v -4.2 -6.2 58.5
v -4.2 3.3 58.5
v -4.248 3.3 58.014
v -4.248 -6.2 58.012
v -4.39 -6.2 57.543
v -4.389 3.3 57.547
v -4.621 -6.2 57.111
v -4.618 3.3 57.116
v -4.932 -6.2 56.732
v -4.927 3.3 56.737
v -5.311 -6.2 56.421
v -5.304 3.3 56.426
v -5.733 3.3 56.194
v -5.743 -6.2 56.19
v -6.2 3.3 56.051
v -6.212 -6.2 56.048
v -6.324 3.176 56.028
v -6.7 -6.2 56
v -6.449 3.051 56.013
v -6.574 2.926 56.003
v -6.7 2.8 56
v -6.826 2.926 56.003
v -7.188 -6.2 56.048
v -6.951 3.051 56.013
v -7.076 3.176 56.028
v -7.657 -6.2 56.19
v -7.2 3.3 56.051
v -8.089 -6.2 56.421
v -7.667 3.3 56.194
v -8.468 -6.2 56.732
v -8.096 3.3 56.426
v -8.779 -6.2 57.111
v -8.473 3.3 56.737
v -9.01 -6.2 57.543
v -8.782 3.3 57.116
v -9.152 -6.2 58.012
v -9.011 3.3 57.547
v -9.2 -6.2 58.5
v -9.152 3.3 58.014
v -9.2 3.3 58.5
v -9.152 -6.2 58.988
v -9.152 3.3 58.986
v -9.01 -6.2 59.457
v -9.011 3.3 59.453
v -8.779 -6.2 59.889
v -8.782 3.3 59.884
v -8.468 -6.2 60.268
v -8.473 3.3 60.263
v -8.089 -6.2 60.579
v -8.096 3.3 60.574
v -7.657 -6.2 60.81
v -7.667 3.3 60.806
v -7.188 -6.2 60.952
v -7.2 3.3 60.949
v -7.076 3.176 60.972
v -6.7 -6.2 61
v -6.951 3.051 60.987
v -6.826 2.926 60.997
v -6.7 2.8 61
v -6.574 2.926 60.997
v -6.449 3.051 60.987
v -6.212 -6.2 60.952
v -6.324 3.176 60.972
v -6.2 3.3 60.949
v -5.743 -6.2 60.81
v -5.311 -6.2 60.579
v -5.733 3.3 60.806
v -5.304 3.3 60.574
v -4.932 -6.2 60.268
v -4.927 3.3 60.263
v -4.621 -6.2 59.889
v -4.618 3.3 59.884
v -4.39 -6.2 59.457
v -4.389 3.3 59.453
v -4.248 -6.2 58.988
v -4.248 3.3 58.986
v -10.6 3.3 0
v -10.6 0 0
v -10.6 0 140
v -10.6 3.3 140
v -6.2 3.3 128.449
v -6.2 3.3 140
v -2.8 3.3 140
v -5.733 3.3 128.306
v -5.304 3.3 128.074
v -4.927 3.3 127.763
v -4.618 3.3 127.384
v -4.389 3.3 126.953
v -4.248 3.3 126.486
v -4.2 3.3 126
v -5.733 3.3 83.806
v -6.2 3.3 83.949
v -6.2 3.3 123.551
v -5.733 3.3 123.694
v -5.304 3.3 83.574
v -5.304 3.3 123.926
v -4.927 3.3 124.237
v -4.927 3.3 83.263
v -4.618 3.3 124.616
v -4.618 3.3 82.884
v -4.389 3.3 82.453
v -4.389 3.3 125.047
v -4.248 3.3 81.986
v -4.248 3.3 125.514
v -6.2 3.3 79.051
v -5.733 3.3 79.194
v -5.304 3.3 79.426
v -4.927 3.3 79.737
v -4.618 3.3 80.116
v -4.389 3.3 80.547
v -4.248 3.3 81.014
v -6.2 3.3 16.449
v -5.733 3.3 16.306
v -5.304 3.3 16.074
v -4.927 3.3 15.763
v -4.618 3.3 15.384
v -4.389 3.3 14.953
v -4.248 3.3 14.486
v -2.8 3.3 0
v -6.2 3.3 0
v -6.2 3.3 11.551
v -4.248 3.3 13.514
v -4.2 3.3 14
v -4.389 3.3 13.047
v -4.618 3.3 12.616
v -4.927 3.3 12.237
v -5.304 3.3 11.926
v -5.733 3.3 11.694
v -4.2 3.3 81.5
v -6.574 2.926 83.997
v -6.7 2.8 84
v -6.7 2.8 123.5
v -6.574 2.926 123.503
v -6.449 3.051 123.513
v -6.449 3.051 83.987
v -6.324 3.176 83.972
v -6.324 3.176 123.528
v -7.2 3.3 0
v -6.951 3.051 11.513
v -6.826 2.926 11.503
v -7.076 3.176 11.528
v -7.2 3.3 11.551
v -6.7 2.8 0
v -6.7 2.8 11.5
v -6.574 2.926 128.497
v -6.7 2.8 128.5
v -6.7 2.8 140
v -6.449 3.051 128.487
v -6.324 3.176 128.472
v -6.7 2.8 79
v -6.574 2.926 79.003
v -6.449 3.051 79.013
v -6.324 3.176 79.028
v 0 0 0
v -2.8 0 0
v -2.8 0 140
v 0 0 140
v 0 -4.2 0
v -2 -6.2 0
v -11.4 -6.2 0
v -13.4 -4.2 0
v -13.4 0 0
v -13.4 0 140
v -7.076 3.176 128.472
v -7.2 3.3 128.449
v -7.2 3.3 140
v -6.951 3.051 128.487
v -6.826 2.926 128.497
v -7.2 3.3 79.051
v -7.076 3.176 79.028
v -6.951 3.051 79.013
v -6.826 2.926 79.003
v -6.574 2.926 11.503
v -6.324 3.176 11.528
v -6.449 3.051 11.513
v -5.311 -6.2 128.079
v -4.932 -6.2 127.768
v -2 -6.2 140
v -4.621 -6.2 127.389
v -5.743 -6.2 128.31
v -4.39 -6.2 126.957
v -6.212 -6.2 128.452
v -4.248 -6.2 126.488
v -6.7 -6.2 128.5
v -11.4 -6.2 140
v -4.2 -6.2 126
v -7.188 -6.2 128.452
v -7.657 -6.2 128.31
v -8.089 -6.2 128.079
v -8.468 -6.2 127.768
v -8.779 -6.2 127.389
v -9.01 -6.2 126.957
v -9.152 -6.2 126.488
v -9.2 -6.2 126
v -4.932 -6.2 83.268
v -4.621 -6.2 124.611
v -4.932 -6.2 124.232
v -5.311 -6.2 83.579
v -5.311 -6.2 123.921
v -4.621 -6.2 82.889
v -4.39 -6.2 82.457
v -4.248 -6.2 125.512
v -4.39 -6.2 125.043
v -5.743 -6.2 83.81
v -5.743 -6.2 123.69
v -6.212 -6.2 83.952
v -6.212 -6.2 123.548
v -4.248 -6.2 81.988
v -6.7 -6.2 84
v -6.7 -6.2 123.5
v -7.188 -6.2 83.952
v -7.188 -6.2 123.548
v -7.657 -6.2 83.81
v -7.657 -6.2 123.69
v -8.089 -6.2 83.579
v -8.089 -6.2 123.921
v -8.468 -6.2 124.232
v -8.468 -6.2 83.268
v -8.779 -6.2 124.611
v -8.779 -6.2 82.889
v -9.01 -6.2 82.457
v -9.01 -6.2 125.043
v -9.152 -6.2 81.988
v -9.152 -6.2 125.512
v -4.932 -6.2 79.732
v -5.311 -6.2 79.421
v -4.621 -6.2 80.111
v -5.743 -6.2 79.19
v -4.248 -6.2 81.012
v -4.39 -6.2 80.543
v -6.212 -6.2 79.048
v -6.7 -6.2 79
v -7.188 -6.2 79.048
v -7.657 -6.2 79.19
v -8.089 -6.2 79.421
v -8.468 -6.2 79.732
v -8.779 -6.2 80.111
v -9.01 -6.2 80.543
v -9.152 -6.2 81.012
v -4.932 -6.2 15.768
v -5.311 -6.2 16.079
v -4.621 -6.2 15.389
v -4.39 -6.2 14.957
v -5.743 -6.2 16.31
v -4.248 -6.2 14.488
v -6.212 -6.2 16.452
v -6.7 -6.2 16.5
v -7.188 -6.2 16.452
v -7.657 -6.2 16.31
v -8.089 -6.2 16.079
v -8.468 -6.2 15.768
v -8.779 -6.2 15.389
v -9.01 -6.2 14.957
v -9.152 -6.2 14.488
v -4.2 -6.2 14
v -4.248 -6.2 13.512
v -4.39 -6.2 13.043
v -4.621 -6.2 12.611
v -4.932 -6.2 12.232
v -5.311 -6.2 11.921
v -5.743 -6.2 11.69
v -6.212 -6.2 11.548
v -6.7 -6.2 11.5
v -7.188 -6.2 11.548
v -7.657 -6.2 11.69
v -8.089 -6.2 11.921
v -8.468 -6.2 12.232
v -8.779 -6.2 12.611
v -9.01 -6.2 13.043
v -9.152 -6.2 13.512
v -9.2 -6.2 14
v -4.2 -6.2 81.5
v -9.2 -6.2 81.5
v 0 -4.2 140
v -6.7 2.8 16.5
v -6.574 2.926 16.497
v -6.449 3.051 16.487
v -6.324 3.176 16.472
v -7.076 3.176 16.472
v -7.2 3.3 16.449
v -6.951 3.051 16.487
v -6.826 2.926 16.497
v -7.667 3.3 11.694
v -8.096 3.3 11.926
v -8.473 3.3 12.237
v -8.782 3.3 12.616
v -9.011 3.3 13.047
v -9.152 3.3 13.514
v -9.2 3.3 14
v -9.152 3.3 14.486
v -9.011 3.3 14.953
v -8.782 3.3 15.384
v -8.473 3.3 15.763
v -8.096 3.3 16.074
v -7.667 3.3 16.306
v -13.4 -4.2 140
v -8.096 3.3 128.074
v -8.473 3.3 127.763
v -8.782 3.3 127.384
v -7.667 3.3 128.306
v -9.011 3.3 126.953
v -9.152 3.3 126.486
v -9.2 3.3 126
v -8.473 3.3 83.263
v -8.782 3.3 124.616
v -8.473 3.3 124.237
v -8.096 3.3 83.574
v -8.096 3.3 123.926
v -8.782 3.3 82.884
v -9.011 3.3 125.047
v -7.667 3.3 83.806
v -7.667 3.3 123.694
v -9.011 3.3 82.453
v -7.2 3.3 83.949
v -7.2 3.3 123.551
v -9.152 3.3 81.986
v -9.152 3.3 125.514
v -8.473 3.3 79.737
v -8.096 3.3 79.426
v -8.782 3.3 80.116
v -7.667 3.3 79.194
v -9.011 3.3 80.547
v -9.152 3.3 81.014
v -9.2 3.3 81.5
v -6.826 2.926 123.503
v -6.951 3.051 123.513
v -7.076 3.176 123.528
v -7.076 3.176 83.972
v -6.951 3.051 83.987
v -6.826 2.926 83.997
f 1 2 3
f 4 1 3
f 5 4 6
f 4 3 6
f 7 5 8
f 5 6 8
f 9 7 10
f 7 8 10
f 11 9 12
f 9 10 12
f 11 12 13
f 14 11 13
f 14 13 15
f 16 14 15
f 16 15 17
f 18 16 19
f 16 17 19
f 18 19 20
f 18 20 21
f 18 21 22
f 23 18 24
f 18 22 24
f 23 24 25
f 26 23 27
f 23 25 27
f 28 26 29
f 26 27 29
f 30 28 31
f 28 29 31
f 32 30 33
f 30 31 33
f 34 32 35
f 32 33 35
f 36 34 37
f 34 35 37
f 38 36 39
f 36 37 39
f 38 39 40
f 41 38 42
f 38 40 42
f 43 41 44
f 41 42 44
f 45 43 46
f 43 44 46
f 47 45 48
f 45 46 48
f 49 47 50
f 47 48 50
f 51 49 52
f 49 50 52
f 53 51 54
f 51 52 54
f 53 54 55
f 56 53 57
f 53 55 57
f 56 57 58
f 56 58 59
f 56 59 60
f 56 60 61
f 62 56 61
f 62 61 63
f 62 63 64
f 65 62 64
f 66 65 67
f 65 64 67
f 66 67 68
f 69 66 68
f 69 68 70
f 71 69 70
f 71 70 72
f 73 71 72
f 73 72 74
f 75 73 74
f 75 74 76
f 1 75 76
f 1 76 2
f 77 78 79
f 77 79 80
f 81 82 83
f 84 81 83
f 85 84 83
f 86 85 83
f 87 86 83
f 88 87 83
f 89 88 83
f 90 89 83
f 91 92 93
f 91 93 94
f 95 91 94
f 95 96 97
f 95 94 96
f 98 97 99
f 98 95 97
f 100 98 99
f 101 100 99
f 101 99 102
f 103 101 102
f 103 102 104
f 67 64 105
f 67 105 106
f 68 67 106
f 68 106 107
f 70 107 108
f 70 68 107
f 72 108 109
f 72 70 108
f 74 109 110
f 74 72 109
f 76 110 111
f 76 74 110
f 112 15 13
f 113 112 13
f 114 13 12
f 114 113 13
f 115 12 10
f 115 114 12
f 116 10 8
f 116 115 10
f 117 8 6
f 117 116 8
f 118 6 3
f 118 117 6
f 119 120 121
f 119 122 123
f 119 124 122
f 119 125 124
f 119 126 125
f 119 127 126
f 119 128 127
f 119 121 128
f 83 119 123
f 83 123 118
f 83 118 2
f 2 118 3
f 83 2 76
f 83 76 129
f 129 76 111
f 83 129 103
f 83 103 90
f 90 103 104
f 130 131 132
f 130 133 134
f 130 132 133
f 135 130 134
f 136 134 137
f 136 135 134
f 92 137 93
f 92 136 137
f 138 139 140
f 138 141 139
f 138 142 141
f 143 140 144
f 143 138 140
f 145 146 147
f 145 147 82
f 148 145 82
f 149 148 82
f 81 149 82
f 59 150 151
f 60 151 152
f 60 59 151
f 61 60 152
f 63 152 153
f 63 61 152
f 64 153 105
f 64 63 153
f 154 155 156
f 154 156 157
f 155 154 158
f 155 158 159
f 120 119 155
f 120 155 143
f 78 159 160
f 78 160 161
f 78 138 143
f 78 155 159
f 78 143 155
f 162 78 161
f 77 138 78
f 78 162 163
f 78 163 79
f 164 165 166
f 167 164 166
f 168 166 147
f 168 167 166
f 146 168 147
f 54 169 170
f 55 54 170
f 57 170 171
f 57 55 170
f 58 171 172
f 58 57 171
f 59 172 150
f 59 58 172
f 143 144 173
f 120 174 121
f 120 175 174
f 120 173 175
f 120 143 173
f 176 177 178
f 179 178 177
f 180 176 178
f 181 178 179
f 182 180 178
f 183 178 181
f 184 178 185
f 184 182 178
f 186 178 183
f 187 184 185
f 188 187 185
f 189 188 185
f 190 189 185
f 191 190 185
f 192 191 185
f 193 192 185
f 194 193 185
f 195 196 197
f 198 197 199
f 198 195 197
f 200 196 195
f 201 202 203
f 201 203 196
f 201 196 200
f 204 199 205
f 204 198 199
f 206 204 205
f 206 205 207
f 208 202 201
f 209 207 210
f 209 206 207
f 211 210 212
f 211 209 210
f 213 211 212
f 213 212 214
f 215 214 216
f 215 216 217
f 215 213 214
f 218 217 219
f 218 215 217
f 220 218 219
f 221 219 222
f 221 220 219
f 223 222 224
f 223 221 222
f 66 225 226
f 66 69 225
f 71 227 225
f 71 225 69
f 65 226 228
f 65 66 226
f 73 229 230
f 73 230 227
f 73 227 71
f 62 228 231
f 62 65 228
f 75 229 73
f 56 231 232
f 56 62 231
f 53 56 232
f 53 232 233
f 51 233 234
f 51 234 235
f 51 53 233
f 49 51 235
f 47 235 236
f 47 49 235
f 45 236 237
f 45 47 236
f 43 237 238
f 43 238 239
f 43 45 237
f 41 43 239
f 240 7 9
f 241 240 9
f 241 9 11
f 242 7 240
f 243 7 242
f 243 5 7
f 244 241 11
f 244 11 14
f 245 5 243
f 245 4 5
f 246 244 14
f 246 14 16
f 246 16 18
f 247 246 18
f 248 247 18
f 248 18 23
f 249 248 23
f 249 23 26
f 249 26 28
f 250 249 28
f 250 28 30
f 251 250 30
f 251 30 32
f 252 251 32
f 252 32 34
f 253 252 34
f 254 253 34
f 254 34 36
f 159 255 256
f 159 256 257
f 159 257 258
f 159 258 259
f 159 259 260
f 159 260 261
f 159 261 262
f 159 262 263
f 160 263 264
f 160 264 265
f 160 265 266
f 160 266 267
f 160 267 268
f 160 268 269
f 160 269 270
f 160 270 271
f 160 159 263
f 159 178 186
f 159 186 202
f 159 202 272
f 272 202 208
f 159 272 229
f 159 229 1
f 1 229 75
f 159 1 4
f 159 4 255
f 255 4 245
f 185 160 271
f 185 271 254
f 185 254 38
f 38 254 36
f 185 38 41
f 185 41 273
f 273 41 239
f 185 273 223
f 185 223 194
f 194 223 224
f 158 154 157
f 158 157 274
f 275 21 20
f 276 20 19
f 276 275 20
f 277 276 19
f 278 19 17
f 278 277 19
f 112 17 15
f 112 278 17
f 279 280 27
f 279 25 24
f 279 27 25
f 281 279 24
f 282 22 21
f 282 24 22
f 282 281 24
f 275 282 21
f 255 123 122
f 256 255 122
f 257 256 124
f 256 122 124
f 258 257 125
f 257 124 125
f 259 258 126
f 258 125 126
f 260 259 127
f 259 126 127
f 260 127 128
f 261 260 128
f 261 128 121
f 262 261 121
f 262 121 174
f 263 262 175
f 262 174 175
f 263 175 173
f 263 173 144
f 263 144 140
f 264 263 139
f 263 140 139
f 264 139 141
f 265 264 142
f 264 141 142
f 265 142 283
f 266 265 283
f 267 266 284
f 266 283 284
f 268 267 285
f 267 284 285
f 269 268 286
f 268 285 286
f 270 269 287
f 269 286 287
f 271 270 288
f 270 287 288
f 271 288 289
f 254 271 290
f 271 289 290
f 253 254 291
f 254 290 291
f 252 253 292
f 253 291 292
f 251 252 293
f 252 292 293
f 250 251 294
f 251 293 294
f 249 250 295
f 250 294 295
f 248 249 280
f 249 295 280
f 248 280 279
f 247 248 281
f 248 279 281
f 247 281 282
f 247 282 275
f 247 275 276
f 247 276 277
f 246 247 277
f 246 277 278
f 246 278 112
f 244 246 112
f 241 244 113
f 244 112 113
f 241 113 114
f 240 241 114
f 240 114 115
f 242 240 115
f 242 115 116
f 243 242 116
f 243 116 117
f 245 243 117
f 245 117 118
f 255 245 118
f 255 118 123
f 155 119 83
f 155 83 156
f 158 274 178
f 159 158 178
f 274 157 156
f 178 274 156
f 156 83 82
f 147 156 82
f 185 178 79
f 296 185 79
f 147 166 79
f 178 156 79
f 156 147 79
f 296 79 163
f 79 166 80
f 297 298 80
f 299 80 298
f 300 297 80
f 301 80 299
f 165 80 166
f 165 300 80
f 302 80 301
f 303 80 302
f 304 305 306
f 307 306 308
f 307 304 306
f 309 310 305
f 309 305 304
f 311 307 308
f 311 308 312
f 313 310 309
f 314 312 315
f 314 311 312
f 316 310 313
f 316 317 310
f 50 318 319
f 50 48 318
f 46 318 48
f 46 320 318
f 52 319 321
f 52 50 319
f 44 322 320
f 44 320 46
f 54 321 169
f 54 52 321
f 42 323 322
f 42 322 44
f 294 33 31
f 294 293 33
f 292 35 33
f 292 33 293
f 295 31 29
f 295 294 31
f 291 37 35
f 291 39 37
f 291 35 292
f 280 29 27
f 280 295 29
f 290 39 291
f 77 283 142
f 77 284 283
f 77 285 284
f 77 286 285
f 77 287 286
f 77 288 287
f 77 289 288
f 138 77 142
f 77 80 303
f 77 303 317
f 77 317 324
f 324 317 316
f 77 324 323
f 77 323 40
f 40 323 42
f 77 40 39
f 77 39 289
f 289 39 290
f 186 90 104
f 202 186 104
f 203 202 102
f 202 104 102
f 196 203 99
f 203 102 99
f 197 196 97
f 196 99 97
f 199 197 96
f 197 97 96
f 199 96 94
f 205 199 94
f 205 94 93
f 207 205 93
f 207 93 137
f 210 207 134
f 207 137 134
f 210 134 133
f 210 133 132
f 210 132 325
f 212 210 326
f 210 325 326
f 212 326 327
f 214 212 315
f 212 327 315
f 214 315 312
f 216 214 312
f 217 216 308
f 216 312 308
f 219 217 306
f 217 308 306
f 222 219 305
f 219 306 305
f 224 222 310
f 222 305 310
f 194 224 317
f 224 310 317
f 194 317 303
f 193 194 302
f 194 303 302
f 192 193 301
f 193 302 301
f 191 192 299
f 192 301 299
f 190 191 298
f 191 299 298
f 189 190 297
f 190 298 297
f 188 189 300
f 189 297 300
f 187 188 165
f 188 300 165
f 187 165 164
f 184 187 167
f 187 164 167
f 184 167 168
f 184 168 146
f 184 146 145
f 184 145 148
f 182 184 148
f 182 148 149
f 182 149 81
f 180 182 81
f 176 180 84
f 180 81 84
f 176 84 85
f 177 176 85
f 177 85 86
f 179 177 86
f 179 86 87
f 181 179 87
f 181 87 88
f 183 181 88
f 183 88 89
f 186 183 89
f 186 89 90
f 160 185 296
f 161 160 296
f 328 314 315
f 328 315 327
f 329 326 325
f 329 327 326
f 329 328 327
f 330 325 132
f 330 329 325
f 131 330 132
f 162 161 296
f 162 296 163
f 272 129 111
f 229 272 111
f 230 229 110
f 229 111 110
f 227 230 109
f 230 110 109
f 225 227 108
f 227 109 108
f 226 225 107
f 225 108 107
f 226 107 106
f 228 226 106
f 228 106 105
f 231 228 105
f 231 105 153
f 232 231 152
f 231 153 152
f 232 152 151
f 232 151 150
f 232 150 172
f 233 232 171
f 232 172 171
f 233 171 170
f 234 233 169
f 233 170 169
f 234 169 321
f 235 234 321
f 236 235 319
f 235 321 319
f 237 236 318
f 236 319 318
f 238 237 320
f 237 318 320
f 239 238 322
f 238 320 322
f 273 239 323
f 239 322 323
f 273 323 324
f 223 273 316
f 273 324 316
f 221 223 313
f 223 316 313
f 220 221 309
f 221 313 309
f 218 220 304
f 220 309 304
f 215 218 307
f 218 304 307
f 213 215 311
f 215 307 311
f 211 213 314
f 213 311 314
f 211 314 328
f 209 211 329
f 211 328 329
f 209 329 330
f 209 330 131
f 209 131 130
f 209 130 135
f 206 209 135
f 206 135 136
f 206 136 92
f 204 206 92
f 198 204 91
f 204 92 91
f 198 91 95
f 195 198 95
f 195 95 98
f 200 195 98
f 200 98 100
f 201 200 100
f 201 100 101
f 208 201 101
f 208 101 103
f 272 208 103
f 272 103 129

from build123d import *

# Parameters (mm, degrees)
EXTRUDE_1_DEPTH        = 140
HOLE_WIZARD_M6_1_D     = 5
HOLE_WIZARD_M6_1_DEPTH = 28
HOLE_WIZARD_M6_1_TIP   = 1.502151548


with BuildPart() as part:
    # 草图1 → 凸台-拉伸1 (new body)
    with BuildSketch(Plane.XY):
        Polygon((-2, -6.2), (-11.4, -6.2), (-13.4, -4.2), (-13.4, 0), (-10.6, 0), (-10.6, 3.3), (-7.2, 3.3), (-6.7, 2.8), (-6.2, 3.3), (-2.8, 3.3), (-2.8, 0), (0, 0), (0, -4.2), align=None)
    extrude(amount=EXTRUDE_1_DEPTH)

    # M6 螺纹孔1
    with Locations(Plane(origin=(-6.7, -6.2, 14), x_dir=(-1, 0, 0), z_dir=(0, -1, 0))):
        with Locations((0, 0), (0, -44.5), (0, -67.5), (0, -112)):
            Hole(HOLE_WIZARD_M6_1_D / 2, depth=HOLE_WIZARD_M6_1_DEPTH)
            with Locations((0, 0, -(HOLE_WIZARD_M6_1_DEPTH + HOLE_WIZARD_M6_1_TIP / 2))):  # 118° drill point
                Cone(0, HOLE_WIZARD_M6_1_D / 2, HOLE_WIZARD_M6_1_TIP, mode=Mode.SUBTRACT)


solid = part.part
